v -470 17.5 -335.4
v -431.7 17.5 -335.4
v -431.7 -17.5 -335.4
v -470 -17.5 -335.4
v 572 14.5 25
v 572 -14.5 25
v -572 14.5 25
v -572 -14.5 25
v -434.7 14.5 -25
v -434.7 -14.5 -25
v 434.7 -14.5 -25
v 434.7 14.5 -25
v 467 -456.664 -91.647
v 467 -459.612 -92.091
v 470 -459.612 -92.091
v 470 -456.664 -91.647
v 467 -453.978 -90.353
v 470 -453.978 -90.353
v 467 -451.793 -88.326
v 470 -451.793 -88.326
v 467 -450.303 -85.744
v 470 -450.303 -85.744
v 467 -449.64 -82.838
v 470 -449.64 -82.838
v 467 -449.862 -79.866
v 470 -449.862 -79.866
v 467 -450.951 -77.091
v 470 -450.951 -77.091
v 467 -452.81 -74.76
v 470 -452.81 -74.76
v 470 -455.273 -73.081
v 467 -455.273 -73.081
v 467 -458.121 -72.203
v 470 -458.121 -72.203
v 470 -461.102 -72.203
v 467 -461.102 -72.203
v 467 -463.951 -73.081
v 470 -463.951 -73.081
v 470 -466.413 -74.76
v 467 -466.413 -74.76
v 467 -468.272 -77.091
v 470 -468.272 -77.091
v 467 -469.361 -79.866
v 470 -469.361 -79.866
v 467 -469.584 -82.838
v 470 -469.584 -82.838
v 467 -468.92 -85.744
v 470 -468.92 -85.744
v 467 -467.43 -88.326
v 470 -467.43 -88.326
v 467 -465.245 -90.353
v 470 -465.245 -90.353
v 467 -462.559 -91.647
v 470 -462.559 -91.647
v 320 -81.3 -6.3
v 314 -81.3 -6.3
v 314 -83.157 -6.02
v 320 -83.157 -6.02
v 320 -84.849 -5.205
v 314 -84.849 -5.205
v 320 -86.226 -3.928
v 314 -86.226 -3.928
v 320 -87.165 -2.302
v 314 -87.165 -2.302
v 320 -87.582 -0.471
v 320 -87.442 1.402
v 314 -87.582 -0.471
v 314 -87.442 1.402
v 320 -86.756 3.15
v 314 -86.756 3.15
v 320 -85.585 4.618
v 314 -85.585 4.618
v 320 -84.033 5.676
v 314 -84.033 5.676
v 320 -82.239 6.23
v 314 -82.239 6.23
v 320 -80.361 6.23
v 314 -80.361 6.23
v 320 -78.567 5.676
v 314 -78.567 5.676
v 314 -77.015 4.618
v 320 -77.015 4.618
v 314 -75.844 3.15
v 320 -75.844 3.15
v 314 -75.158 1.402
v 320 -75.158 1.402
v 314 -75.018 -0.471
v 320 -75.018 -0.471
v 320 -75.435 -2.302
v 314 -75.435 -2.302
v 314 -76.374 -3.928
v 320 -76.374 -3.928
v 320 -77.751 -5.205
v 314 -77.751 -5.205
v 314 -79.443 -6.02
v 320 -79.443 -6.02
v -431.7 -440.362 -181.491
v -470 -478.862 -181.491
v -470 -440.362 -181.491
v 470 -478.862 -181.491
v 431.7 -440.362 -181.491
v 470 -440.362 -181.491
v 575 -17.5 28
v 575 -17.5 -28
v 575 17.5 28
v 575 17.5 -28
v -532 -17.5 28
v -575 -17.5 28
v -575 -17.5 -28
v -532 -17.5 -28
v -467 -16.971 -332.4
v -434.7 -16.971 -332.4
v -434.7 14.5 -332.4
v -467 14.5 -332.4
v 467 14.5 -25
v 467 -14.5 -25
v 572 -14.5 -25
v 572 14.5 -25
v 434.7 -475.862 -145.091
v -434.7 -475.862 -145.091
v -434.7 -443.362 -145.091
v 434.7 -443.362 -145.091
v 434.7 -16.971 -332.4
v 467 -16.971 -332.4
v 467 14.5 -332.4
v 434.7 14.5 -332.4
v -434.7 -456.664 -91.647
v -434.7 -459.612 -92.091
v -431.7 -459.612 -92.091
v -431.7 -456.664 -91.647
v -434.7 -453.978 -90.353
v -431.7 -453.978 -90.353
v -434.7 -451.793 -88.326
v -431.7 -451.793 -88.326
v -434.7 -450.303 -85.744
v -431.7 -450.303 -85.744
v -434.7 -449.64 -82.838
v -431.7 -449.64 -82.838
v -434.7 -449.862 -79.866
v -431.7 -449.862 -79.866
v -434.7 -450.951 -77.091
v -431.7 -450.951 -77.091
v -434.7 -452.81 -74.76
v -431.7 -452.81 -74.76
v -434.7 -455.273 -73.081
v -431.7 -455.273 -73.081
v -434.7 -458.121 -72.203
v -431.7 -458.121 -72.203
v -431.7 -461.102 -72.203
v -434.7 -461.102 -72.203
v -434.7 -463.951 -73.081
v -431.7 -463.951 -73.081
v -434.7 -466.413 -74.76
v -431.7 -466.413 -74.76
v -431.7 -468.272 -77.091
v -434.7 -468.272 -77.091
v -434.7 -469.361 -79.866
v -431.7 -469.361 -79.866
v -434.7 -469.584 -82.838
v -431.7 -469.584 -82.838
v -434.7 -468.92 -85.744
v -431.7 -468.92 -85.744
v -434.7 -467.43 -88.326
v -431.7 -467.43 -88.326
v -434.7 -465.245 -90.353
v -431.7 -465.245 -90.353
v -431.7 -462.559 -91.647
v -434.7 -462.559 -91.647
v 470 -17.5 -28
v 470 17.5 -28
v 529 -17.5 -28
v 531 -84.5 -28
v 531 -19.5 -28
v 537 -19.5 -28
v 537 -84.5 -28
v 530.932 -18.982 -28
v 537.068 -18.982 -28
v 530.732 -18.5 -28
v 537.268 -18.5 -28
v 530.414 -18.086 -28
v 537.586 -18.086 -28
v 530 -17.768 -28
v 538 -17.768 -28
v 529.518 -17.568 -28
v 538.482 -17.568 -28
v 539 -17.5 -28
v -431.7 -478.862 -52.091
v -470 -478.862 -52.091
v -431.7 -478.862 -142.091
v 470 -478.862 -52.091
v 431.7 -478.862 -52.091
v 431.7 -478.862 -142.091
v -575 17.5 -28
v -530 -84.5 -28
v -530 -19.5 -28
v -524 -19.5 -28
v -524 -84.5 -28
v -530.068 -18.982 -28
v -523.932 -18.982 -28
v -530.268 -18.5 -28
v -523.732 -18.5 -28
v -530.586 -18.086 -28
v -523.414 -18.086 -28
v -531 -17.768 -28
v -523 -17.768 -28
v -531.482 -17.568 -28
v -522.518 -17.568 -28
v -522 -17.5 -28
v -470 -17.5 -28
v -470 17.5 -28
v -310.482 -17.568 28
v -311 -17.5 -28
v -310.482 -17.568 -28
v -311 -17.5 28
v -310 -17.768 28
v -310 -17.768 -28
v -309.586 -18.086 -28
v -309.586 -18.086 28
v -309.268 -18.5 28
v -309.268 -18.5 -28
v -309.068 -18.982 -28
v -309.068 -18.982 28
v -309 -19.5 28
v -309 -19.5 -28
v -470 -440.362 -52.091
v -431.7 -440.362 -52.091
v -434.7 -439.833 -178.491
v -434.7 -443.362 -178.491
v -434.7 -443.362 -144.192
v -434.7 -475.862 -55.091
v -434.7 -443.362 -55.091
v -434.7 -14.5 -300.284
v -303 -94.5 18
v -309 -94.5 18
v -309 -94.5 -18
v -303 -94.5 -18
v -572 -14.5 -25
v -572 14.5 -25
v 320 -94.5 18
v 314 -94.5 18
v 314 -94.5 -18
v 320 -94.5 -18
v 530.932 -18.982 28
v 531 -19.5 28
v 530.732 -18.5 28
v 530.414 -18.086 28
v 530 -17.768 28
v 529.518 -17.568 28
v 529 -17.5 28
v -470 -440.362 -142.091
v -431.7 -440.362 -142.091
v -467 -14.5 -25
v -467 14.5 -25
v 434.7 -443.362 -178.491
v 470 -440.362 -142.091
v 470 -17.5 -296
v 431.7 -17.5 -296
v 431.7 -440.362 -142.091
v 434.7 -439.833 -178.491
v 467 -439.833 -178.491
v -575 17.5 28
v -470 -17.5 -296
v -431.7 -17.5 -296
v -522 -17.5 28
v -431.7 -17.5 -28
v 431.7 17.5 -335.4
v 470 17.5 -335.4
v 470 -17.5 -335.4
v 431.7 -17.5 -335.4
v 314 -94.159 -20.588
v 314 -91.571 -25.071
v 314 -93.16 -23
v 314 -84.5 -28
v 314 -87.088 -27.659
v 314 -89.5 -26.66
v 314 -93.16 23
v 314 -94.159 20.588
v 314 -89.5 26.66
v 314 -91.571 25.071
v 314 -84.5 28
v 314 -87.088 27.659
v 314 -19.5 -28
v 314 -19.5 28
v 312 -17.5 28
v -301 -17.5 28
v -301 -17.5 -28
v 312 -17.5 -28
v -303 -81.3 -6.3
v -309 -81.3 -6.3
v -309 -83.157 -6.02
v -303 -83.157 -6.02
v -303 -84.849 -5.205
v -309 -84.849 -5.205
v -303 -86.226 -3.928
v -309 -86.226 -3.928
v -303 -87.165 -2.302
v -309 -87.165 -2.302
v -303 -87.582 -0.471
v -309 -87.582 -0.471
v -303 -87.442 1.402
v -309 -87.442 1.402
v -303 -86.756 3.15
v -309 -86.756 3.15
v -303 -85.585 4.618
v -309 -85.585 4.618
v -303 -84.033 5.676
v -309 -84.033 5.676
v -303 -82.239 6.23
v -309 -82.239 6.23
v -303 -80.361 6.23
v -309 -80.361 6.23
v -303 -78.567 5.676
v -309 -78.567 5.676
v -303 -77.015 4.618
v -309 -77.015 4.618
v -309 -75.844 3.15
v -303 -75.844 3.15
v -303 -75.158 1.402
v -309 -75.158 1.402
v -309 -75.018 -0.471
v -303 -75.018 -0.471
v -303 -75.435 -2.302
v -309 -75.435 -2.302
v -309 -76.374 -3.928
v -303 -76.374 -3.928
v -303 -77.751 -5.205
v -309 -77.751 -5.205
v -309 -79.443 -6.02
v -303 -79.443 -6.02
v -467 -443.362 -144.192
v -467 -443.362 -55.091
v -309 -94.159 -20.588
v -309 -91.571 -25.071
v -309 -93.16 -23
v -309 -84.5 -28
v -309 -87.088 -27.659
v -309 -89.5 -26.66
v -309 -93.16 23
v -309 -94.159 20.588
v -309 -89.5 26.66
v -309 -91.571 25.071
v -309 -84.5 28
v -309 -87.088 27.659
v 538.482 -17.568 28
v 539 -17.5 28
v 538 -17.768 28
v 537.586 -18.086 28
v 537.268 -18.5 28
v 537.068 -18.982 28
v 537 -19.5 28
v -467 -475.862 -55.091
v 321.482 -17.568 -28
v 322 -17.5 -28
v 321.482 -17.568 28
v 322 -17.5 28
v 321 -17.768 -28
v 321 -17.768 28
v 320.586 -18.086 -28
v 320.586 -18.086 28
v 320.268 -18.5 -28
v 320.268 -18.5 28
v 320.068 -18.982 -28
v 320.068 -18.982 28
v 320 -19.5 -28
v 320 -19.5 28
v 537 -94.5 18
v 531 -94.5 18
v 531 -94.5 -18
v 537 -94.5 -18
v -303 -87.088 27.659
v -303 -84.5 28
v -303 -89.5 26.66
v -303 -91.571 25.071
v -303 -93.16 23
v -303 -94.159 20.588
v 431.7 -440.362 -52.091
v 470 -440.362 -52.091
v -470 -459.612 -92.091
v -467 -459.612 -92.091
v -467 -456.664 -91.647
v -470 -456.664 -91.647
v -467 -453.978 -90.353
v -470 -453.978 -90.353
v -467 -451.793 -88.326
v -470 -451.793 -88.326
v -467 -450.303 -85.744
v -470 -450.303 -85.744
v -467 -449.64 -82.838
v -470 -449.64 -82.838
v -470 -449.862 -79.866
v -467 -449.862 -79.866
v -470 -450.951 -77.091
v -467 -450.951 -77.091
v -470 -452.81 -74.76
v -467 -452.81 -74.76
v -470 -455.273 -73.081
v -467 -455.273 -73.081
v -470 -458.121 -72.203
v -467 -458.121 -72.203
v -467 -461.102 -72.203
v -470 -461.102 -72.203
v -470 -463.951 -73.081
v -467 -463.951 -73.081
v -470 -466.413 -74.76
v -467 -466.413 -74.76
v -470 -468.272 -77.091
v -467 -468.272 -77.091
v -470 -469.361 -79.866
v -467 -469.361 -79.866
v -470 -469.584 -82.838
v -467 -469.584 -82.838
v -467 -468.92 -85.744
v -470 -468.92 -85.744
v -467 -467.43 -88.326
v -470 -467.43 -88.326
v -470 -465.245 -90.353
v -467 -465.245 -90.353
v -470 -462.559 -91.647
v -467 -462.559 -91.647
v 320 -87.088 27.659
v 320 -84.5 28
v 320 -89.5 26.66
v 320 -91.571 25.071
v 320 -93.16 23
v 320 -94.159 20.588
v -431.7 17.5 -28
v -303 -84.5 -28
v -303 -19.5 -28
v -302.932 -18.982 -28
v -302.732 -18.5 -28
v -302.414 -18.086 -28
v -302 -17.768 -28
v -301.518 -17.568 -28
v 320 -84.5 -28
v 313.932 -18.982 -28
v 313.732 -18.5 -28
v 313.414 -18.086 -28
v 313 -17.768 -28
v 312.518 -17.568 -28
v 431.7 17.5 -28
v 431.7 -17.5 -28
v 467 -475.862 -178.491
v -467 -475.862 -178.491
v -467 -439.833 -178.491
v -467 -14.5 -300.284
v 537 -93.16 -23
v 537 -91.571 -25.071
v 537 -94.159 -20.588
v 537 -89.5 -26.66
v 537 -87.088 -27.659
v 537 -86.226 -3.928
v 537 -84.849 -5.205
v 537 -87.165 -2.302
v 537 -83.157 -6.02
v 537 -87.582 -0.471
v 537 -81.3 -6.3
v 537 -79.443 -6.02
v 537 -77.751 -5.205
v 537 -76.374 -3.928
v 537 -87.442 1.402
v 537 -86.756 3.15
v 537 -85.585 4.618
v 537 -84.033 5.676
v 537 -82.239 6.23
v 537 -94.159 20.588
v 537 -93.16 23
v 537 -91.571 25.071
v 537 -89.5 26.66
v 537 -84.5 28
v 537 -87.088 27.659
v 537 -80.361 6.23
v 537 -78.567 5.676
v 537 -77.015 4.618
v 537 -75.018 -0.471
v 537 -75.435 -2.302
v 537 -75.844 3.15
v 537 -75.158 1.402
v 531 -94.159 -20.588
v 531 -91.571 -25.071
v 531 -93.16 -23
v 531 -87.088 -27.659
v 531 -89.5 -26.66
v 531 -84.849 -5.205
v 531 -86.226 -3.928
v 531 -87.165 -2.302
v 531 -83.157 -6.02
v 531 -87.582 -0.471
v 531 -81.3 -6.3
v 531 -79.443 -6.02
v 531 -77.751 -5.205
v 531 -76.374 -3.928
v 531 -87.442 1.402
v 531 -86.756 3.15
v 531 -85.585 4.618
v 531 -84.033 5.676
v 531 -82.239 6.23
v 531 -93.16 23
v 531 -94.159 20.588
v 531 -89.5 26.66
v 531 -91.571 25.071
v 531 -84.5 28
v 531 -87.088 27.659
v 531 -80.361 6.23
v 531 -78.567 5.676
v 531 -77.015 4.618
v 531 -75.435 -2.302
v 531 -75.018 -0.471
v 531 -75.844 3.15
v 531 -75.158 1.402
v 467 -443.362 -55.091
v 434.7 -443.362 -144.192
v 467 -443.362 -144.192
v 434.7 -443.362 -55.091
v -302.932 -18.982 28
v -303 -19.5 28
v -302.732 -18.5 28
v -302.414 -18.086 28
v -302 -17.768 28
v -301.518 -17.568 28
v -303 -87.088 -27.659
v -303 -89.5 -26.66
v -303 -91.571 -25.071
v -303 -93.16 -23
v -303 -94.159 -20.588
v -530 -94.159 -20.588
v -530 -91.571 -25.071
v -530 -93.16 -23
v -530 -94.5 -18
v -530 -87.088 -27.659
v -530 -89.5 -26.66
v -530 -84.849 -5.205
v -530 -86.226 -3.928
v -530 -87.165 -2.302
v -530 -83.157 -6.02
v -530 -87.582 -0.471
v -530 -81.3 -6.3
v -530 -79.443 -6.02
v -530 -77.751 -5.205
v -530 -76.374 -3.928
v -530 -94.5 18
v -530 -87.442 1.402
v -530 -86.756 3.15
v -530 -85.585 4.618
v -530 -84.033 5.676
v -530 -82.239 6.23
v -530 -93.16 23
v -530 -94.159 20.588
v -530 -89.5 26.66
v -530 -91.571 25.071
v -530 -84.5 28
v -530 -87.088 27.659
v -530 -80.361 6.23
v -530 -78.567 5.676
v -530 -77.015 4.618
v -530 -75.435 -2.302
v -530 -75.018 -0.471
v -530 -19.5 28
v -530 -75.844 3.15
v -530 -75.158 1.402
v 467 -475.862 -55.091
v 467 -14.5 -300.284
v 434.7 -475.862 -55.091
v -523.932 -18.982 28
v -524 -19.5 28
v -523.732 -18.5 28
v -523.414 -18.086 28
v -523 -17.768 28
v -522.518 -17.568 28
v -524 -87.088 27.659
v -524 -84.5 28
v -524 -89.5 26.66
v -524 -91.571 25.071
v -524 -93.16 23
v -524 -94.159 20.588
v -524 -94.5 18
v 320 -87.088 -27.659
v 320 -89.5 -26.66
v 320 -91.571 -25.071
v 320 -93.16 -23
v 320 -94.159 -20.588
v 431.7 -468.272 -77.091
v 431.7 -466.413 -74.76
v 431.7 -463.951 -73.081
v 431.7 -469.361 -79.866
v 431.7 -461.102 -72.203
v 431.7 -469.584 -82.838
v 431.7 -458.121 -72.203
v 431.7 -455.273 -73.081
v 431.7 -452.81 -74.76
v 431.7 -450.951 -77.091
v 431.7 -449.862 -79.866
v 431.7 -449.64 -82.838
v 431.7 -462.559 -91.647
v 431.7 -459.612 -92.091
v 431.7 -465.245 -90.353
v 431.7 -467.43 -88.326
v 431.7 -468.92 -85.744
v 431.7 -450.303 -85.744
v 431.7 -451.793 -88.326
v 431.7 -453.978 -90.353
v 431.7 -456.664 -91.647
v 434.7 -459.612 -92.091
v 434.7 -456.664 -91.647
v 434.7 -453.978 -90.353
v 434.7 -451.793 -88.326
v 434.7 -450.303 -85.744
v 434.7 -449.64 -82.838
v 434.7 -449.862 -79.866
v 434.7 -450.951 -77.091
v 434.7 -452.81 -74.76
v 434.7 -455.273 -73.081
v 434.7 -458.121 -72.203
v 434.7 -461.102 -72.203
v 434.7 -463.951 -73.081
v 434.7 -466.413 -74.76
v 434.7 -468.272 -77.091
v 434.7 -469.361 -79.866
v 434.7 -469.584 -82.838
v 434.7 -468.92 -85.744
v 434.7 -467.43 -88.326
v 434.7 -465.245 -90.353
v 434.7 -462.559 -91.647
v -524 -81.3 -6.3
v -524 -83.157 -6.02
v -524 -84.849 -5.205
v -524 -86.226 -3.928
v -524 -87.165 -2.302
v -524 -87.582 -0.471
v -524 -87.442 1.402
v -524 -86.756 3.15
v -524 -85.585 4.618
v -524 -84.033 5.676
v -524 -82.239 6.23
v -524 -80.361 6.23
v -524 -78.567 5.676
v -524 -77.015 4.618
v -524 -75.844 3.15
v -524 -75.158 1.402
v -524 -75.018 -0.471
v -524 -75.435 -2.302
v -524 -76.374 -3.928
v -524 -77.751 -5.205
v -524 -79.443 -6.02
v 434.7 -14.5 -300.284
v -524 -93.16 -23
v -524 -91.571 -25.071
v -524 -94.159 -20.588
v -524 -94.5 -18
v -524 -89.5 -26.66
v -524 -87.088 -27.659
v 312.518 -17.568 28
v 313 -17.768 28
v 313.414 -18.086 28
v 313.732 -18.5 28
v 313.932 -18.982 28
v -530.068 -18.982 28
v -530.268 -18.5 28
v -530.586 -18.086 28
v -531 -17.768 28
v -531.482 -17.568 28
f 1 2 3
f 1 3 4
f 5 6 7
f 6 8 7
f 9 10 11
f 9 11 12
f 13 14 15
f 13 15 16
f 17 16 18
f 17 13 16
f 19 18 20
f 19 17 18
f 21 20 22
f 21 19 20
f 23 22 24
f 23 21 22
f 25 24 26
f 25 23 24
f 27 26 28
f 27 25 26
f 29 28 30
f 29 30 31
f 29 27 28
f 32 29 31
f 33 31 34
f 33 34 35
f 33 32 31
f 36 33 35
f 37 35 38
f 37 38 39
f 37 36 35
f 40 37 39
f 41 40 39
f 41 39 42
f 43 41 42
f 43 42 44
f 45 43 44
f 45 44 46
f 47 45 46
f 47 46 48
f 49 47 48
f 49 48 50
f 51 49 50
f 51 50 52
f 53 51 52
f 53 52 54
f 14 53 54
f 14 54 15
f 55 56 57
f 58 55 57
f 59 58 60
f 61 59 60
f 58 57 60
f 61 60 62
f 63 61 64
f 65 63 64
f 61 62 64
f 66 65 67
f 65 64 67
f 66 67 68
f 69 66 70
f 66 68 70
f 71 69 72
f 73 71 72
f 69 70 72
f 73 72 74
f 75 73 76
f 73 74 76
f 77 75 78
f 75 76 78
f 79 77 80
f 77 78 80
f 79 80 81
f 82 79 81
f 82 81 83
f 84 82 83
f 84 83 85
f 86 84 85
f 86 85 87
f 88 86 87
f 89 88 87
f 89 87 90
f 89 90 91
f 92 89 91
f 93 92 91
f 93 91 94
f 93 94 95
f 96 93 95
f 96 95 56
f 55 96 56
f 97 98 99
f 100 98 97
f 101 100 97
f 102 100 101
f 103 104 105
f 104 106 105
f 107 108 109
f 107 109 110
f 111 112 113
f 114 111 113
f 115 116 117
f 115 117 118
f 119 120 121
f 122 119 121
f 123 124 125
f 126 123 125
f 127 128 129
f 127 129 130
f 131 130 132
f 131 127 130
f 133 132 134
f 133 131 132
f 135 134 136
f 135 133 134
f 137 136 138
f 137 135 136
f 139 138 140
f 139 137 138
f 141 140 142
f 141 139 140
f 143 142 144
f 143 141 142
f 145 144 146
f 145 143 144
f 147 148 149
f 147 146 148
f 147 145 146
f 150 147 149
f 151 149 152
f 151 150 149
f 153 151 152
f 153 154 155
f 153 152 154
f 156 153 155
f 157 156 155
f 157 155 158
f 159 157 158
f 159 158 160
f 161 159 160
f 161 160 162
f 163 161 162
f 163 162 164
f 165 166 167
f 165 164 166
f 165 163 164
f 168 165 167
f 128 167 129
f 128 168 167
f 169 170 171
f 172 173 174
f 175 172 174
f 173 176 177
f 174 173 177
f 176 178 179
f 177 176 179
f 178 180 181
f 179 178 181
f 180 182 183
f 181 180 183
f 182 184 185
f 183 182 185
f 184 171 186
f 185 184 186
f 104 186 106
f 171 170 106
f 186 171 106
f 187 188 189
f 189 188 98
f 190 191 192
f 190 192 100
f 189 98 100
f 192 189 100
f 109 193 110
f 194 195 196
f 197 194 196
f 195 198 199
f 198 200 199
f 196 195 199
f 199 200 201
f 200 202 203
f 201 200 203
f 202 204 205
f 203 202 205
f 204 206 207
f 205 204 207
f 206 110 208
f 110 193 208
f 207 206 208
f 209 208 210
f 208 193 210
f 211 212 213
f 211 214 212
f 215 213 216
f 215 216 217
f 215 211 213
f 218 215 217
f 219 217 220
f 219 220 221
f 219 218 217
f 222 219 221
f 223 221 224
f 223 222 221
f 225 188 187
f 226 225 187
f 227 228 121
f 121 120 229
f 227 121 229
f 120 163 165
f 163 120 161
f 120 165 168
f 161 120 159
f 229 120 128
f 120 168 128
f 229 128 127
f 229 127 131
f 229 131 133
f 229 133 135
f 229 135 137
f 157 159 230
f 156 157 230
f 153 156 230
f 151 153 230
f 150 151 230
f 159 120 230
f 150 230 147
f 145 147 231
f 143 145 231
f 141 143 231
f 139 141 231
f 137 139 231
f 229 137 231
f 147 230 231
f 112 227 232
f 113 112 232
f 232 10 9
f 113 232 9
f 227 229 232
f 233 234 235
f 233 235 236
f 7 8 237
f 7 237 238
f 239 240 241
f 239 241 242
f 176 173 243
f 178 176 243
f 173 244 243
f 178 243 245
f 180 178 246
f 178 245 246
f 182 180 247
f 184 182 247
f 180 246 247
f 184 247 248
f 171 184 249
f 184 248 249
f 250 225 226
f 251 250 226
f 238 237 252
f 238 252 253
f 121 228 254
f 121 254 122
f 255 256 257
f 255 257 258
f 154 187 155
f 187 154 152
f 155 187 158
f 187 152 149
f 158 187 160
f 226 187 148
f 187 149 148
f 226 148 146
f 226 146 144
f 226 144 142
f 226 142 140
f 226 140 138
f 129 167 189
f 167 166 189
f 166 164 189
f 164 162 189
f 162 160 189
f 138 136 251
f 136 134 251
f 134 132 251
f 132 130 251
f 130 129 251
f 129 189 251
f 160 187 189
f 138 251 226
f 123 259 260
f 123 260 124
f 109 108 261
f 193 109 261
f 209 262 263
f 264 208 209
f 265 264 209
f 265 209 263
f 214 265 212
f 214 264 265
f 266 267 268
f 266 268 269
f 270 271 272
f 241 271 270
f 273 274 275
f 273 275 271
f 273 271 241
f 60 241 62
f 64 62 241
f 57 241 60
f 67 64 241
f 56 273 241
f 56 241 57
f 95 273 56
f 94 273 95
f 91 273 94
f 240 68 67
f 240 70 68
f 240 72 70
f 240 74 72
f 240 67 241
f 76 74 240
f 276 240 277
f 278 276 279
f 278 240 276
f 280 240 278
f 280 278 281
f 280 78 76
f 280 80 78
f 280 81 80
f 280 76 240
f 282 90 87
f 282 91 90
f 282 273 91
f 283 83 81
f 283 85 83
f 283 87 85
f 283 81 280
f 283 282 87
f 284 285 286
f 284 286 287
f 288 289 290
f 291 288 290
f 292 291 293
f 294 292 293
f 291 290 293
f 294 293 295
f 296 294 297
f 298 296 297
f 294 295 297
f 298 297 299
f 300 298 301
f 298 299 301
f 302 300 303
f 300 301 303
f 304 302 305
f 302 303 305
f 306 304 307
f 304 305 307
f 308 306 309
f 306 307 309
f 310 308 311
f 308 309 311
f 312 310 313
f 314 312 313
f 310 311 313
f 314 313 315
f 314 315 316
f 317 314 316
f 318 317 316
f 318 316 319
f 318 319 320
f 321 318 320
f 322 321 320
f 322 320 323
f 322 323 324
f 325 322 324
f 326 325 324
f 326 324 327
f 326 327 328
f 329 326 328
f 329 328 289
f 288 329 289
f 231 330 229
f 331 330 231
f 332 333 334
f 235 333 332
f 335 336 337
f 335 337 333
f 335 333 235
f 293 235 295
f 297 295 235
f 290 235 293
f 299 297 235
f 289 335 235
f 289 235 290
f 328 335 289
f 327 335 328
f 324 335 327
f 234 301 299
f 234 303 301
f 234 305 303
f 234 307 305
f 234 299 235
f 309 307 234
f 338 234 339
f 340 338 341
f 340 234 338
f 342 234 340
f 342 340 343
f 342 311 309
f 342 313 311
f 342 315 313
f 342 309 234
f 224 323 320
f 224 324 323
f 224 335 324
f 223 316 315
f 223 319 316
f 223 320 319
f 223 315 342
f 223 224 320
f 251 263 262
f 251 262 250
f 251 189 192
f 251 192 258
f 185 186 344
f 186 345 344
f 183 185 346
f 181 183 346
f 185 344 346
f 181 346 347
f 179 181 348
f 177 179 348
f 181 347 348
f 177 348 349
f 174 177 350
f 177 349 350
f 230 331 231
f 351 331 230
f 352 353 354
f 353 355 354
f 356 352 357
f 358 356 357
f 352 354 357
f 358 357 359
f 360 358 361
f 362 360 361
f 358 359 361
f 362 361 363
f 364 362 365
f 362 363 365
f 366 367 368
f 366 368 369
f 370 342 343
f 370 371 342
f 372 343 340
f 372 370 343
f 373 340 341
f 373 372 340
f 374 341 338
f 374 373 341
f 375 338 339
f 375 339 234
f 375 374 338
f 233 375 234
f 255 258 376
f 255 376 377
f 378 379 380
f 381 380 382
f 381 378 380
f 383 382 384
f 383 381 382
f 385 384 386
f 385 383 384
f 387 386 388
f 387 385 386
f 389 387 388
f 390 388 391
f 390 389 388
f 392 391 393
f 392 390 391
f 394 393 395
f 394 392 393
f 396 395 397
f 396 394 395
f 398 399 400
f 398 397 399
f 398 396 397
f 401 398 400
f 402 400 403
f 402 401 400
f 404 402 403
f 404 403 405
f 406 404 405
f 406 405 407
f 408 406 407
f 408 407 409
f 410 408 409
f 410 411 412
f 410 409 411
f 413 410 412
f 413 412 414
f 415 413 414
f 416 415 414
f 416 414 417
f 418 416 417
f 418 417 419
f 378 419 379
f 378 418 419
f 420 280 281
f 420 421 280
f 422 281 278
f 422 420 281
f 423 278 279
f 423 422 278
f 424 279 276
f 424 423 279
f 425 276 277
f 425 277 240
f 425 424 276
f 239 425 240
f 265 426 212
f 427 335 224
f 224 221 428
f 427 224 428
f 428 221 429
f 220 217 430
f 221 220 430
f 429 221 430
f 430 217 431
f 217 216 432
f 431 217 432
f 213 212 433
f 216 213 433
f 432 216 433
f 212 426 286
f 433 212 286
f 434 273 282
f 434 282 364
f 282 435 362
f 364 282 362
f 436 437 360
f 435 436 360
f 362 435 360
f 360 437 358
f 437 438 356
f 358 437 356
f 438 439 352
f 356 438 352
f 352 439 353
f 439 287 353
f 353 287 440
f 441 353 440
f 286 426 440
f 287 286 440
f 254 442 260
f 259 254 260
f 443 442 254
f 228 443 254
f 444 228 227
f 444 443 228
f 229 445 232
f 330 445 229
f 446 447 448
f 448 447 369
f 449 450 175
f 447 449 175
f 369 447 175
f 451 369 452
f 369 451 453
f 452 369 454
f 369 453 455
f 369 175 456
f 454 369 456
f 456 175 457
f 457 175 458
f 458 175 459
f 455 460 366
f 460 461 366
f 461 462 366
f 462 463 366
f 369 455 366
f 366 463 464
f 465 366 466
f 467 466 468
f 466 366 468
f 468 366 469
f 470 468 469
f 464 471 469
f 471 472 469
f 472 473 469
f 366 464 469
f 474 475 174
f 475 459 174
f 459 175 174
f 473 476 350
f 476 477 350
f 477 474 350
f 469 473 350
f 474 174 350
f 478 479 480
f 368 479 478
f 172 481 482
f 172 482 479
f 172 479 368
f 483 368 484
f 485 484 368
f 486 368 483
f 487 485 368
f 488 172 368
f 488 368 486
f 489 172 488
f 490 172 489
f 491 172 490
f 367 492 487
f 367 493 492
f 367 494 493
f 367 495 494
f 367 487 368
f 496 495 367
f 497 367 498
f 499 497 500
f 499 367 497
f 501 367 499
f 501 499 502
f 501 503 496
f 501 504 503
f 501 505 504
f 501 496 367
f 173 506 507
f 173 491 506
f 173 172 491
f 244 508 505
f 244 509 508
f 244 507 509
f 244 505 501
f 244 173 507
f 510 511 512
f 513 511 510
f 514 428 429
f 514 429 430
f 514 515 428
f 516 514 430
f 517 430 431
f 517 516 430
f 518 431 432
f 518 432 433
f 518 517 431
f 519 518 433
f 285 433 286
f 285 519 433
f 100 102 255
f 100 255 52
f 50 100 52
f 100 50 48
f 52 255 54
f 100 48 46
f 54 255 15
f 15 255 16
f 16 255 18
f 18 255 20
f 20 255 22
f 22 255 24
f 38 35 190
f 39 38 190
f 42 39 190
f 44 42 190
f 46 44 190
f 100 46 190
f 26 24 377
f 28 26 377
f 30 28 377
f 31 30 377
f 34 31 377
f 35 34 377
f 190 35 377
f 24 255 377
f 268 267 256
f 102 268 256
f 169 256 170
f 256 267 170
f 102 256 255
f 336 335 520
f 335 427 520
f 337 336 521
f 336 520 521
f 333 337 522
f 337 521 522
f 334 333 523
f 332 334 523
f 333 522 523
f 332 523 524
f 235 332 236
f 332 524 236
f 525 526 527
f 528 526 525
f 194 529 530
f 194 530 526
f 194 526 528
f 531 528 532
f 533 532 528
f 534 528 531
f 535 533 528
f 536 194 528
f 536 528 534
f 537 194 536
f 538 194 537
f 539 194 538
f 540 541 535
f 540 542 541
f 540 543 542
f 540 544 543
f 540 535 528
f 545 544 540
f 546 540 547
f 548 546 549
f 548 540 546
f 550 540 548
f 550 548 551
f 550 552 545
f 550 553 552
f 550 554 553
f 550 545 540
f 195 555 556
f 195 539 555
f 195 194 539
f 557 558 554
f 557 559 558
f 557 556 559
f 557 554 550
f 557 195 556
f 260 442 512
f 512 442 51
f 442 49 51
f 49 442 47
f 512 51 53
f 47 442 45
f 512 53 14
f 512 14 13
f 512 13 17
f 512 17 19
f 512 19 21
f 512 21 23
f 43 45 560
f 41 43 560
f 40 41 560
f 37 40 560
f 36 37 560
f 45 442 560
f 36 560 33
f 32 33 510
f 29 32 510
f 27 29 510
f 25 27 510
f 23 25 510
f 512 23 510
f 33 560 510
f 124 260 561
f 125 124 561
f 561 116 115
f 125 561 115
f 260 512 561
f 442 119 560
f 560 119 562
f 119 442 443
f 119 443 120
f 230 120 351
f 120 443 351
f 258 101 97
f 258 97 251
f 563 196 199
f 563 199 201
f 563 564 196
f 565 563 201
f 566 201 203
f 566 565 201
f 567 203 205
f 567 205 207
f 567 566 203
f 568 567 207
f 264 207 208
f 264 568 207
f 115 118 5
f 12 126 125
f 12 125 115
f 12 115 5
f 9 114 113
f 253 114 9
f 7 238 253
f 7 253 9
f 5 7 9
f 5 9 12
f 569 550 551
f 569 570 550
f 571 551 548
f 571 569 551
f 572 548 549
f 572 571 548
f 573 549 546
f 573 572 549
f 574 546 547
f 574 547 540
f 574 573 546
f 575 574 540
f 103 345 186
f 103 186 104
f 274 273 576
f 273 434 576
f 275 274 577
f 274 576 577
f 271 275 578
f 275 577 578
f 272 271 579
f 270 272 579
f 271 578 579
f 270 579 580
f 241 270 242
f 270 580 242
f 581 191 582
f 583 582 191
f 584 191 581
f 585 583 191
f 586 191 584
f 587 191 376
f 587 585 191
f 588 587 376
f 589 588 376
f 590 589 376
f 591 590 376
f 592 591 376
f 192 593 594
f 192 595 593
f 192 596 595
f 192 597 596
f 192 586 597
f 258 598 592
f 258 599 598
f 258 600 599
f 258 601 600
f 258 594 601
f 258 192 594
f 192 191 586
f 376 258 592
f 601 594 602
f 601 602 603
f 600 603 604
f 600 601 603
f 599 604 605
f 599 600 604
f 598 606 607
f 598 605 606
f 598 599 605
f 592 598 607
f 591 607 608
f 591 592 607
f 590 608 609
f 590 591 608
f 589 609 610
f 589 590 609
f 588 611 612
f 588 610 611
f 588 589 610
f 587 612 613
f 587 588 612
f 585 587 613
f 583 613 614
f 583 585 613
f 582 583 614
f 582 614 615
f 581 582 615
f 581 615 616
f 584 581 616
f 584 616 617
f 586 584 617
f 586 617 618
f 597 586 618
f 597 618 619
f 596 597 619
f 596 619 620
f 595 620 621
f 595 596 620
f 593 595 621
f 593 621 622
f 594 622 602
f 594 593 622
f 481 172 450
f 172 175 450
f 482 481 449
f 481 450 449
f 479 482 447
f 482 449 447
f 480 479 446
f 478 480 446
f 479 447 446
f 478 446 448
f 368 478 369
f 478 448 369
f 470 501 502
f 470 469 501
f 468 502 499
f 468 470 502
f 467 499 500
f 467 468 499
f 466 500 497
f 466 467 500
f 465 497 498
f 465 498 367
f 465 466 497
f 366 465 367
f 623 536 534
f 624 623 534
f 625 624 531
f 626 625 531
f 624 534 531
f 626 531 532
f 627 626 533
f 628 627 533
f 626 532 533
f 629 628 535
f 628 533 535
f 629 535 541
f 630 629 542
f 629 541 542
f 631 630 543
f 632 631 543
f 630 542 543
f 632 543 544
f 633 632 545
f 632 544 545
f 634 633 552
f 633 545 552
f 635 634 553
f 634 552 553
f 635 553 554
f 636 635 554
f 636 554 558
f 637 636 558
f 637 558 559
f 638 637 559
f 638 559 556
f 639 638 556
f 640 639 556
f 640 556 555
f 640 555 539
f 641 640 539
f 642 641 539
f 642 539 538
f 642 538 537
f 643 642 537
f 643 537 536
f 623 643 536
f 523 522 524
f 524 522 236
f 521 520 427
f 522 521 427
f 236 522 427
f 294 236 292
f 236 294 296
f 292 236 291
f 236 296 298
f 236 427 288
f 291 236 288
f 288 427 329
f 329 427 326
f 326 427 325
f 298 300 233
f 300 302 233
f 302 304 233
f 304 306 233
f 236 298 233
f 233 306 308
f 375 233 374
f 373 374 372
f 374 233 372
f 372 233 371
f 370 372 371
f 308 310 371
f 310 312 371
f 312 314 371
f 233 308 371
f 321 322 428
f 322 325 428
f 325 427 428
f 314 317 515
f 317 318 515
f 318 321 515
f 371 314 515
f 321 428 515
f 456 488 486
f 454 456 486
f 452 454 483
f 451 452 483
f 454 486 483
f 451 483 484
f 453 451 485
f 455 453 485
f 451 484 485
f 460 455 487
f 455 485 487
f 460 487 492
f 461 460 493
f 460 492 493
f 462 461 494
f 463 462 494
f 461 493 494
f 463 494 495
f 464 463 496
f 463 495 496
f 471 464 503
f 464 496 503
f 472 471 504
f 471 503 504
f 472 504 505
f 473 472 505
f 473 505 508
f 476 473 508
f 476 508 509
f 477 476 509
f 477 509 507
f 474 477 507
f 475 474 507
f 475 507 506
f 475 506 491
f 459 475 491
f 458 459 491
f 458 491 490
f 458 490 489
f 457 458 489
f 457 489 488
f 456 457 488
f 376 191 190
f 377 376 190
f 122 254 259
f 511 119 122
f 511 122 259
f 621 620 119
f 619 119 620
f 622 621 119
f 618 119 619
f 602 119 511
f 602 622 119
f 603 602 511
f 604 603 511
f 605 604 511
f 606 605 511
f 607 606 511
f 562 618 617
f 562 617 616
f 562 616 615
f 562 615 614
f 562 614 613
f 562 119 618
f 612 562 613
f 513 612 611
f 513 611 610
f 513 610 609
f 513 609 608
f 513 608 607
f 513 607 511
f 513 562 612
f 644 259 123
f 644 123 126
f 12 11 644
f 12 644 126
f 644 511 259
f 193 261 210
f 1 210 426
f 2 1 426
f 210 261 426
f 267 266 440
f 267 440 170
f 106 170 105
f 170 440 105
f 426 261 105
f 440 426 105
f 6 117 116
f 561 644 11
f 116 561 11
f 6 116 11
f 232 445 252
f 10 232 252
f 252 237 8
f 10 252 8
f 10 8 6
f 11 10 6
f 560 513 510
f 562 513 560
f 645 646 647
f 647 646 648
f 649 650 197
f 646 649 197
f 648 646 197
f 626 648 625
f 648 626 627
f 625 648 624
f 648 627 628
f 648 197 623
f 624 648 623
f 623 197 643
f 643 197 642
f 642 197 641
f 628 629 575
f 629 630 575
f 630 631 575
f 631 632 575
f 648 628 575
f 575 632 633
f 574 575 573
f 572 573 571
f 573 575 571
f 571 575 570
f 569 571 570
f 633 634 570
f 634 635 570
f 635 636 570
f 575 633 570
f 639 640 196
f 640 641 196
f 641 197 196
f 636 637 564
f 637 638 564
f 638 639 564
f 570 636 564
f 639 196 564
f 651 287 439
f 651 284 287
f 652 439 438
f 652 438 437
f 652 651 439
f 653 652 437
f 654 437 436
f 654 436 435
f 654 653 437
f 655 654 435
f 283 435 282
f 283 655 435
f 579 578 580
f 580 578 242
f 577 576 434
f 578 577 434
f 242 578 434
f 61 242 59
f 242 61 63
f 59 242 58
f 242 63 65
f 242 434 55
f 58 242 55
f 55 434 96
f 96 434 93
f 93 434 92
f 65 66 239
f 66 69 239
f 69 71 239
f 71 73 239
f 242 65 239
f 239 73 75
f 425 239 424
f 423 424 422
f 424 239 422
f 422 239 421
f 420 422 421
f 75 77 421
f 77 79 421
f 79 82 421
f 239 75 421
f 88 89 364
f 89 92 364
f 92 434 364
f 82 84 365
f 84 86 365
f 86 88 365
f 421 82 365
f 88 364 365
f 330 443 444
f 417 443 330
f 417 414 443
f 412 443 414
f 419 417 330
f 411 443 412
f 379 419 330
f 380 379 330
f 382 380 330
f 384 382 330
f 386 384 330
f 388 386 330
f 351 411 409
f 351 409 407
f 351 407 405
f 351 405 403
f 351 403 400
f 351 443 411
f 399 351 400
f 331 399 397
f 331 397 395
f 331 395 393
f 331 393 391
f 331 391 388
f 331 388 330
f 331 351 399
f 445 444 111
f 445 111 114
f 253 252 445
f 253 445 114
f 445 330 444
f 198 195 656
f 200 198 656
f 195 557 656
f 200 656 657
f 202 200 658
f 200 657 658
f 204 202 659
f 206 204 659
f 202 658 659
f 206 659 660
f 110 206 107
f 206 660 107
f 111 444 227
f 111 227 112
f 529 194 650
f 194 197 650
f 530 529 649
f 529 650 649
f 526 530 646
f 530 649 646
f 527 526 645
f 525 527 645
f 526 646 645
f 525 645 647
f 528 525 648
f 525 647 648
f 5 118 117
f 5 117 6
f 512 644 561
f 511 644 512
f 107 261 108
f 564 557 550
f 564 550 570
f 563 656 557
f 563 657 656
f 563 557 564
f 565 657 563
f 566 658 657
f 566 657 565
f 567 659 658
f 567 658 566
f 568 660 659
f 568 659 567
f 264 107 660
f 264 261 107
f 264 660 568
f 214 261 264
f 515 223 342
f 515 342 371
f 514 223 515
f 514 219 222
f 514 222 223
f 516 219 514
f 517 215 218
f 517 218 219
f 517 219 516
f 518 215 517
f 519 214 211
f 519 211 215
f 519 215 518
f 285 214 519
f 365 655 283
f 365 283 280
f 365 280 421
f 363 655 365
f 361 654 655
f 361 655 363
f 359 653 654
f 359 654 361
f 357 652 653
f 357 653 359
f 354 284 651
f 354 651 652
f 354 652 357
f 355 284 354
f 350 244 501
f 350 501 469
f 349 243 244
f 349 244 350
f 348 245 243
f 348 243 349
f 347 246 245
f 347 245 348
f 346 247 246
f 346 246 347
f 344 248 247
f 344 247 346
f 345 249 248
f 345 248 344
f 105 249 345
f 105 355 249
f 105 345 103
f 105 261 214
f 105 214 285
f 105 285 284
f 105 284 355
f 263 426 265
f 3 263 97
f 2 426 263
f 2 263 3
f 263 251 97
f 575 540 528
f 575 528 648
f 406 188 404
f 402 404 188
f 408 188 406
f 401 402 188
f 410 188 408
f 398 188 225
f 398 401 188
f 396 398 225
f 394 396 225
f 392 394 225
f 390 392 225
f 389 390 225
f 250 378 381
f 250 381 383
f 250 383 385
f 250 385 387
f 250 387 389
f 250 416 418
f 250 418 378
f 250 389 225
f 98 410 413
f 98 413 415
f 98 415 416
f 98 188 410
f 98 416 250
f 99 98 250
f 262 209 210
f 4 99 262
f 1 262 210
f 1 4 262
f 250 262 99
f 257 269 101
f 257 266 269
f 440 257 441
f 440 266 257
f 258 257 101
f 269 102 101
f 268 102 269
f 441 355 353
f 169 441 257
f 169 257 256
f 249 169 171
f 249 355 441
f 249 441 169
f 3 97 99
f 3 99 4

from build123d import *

# Parameters (mm, degrees)
SKETCH1_W            = 1150
SKETCH1_H            = 35
BOSS_EXTRUDE1_DEPTH  = 28
SKETCH4_W            = 38.3
SKETCH4_H            = 35
BOSS_EXTRUDE4_DEPTH  = 307.4
BOSS_EXTRUDE5_DEPTH  = 38.3
BOSS_EXTRUDE6_DEPTH  = 38.3
SKETCH7_W            = 38.3
SKETCH7_H            = 39.4
BOSS_EXTRUDE7_DEPTH  = 38.5
SKETCH8_W            = 39.4
SKETCH8_H            = 38.5
BOSS_EXTRUDE8_DEPTH  = 901.7
SKETCH9_W            = 38.3
SKETCH9_H            = 38.5
BOSS_EXTRUDE9_DEPTH  = 90
SKETCH11_W           = 6
SKETCH11_H           = 56
BOSS_EXTRUDE10_DEPTH = 77
FILLET1_R            = 10
CUT_EXTRUDE1_REACH   = 1252.131
SKETCH12_R           = 6.3
SHELL1_START         = -467
SHELL1_OUTLINE_W     = 32.5
SHELL1_OUTLINE_H     = 33.4
SHELL1_OUTLINE_W_2   = 29
SHELL1_OUTLINE_H_2   = 50
SHELL1_DEPTH         = 934
SHELL1_2_DEPTH       = 32.3
SHELL1_START_2       = 434.7
SHELL1_3_DEPTH       = 32.3
SHELL1_START_3       = -572
SHELL1_4_OUTLINE_W   = 29
SHELL1_4_OUTLINE_H   = 50
SHELL1_4_DEPTH       = 1147
BOSS_EXTRUDE12_REACH = 830.567
SKETCH17_W           = 3
SKETCH17_H           = 50
FILLET2_R            = 2
CUT_EXTRUDE2_START   = -940
SKETCH18_R           = 10
CUT_EXTRUDE2_DEPTH   = 940


# Read off the part's stored shape, not the designer's step: Shell1
with BuildPart() as part:
    # Sketch1 → Boss-Extrude1 (new, symmetric)
    with BuildSketch(Plane.XY):
        Rectangle(SKETCH1_W, SKETCH1_H)
    extrude(amount=BOSS_EXTRUDE1_DEPTH, both=True)

    # Sketch4 → Boss-Extrude4 (add)
    with BuildSketch(Plane(origin=(0, 0, -28), x_dir=(-1, 0, 0), z_dir=(0, 0, -1))):
        with Locations((-450.85, 0)):
            Rectangle(SKETCH4_W, SKETCH4_H)
        with Locations((450.85, 0)):
            Rectangle(SKETCH4_W, SKETCH4_H)
    extrude(amount=BOSS_EXTRUDE4_DEPTH)

    # Sketch5 → Boss-Extrude5 (add)
    with BuildSketch(Plane(origin=(470, 0, 0), x_dir=(0, 0, -1), z_dir=(1, 0, 0))):
        Polygon((335.4, -17.5), (296, -17.5), (142.090935503, -440.361679354), (181.490935503, -440.361679354), align=None)
    extrude(amount=-BOSS_EXTRUDE5_DEPTH)

    # Sketch6 → Boss-Extrude6 (add)
    with BuildSketch(Plane(origin=(-431.7, 0, 0), x_dir=(0, 0, -1), z_dir=(1, 0, 0))):
        Polygon((335.4, -17.5), (296, -17.5), (142.090935503, -440.361679354), (181.490935503, -440.361679354), align=None)
    extrude(amount=-BOSS_EXTRUDE6_DEPTH)

    # Sketch7 → Boss-Extrude7 (add)
    with BuildSketch(Plane.XZ.offset(440.361679354)):
        with Locations((450.85, -161.790935503)):
            Rectangle(SKETCH7_W, SKETCH7_H)
    extrude(amount=BOSS_EXTRUDE7_DEPTH)

    # Sketch8 → Boss-Extrude8 (add)
    with BuildSketch(Plane.ZY.offset(-431.7)):
        with Locations((-161.790935503, -459.611679354)):
            Rectangle(SKETCH8_W, SKETCH8_H)
    extrude(amount=BOSS_EXTRUDE8_DEPTH)

    # Sketch9 → Boss-Extrude9 (add)
    with BuildSketch(Plane.XY.offset(-142.090935503)):
        with Locations((-450.85, -459.611679354)):
            Rectangle(SKETCH9_W, SKETCH9_H)
        with Locations((450.85, -459.611679354)):
            Rectangle(SKETCH9_W, SKETCH9_H)
    extrude(amount=BOSS_EXTRUDE9_DEPTH)

    # Sketch11 → Boss-Extrude10 (add)
    with BuildSketch(Plane.XZ.offset(17.5)):
        with Locations((-527, 0)):
            Rectangle(SKETCH11_W, SKETCH11_H)
        with Locations((-306, 0)):
            Rectangle(SKETCH11_W, SKETCH11_H)
        with Locations((317, 0)):
            Rectangle(SKETCH11_W, SKETCH11_H)
        with Locations((534, 0)):
            Rectangle(SKETCH11_W, SKETCH11_H)
    extrude(amount=BOSS_EXTRUDE10_DEPTH)

    # Fillet1
    fillet1_edges = [part.edges().sort_by_distance(p)[0] for p in [
        (-527, -94.5, 28),
        (-527, -94.5, -28),
        (-306, -94.5, 28),
        (-306, -94.5, -28),
        (534, -94.5, 28),
        (534, -94.5, -28),
        (317, -94.5, 28),
        (317, -94.5, -28),
    ]]
    fillet(fillet1_edges, radius=FILLET1_R)

    # Cut-Extrude1: up to this face of the body (flat: up to its plane)
    cut_extrude1_end = Plane(part.part.faces().sort_by_distance((537, -55.635386562, 0))[0])
    # Sketch12 → Cut-Extrude1 (cut, up to the picked face)
    with BuildSketch(Plane.ZY.offset(530), mode=Mode.PRIVATE) as cut_extrude1_sk1:
        with Locations(Location((0, -81.3, 0), (0, 0, 180))):
            Circle(SKETCH12_R)
    cut_extrude1_tool1 = split(extrude(cut_extrude1_sk1.sketch, amount=-CUT_EXTRUDE1_REACH, mode=Mode.PRIVATE), bisect_by=cut_extrude1_end, keep=Keep.BOTH, mode=Mode.PRIVATE)
    add(cut_extrude1_tool1.solids().sort_by(Axis((-530, -81.3, 0), (1, 0, 0)))[0], mode=Mode.SUBTRACT)

    # Shell1 outline → Shell1 (cut)
    with BuildSketch(Plane.YZ.offset(SHELL1_START)):
        with Locations((-459.611679354, -161.790935503)):
            Rectangle(SHELL1_OUTLINE_W, SHELL1_OUTLINE_H)
        Rectangle(SHELL1_OUTLINE_W_2, SHELL1_OUTLINE_H_2)
    extrude(amount=SHELL1_DEPTH, mode=Mode.SUBTRACT)

    # Shell1 2 outline → Shell1 2 (cut)
    with BuildSketch(Plane.YZ.offset(SHELL1_START)):
        Polygon((-475.861679354, -55.090935503), (-475.861679354, -145.090935503), (-443.361679354, -145.090935503), (-443.361679354, -178.490935503), (-439.832698412, -178.490935503), (-16.971019058, -332.4), (14.5, -332.4), (14.5, -25), (-14.5, -25), (-14.5, -300.28444402), (-443.361679354, -144.191558118), (-443.361679354, -55.090935503), align=None)
    extrude(amount=SHELL1_2_DEPTH, mode=Mode.SUBTRACT)

    # Shell1 3 outline → Shell1 3 (cut)
    with BuildSketch(Plane.YZ.offset(SHELL1_START_2)):
        Polygon((-475.861679354, -55.090935503), (-475.861679354, -145.090935503), (-443.361679354, -145.090935503), (-443.361679354, -178.490935503), (-439.832698412, -178.490935503), (-16.971019058, -332.4), (14.5, -332.4), (14.5, -25), (-14.5, -25), (-14.5, -300.28444402), (-443.361679354, -144.191558118), (-443.361679354, -55.090935503), align=None)
    extrude(amount=SHELL1_3_DEPTH, mode=Mode.SUBTRACT)

    # Shell1 4 outline → Shell1 4 (cut)
    with BuildSketch(Plane.YZ.offset(SHELL1_START_3)):
        Rectangle(SHELL1_4_OUTLINE_W, SHELL1_4_OUTLINE_H)
    extrude(amount=SHELL1_4_DEPTH, mode=Mode.SUBTRACT)

    # Sketch17 → Boss-Extrude12 (add, up to next)
    with BuildSketch(Plane.XZ.offset(-14.5), mode=Mode.PRIVATE) as boss_extrude12_sk1:
        with Locations((573.5, 0)):
            Rectangle(SKETCH17_W, SKETCH17_H)
    boss_extrude12_tool1 = extrude(boss_extrude12_sk1.sketch, amount=BOSS_EXTRUDE12_REACH, mode=Mode.PRIVATE) - part.part
    add(boss_extrude12_tool1.solids().sort_by_distance((573.5, 14.5, 0))[0])

    # Fillet2
    fillet2_edges = [part.edges().sort_by_distance(p)[0] for p in [
        (-530, -17.5, 0),
        (-524, -17.5, 0),
        (-309, -17.5, 0),
        (-303, -17.5, 0),
        (531, -17.5, 0),
        (537, -17.5, 0),
        (314, -17.5, 0),
        (320, -17.5, 0),
    ]]
    fillet(fillet2_edges, radius=FILLET2_R)

    # Sketch18 → Cut-Extrude2 (cut)
    with BuildSketch(Plane(origin=(470, 0, 0), x_dir=(0, 0, -1), z_dir=(1, 0, 0)).offset(CUT_EXTRUDE2_START)):
        with Locations((82.090935503, -459.611679354)):
            Circle(SKETCH18_R)
    extrude(amount=CUT_EXTRUDE2_DEPTH, mode=Mode.SUBTRACT)


solid = part.part
